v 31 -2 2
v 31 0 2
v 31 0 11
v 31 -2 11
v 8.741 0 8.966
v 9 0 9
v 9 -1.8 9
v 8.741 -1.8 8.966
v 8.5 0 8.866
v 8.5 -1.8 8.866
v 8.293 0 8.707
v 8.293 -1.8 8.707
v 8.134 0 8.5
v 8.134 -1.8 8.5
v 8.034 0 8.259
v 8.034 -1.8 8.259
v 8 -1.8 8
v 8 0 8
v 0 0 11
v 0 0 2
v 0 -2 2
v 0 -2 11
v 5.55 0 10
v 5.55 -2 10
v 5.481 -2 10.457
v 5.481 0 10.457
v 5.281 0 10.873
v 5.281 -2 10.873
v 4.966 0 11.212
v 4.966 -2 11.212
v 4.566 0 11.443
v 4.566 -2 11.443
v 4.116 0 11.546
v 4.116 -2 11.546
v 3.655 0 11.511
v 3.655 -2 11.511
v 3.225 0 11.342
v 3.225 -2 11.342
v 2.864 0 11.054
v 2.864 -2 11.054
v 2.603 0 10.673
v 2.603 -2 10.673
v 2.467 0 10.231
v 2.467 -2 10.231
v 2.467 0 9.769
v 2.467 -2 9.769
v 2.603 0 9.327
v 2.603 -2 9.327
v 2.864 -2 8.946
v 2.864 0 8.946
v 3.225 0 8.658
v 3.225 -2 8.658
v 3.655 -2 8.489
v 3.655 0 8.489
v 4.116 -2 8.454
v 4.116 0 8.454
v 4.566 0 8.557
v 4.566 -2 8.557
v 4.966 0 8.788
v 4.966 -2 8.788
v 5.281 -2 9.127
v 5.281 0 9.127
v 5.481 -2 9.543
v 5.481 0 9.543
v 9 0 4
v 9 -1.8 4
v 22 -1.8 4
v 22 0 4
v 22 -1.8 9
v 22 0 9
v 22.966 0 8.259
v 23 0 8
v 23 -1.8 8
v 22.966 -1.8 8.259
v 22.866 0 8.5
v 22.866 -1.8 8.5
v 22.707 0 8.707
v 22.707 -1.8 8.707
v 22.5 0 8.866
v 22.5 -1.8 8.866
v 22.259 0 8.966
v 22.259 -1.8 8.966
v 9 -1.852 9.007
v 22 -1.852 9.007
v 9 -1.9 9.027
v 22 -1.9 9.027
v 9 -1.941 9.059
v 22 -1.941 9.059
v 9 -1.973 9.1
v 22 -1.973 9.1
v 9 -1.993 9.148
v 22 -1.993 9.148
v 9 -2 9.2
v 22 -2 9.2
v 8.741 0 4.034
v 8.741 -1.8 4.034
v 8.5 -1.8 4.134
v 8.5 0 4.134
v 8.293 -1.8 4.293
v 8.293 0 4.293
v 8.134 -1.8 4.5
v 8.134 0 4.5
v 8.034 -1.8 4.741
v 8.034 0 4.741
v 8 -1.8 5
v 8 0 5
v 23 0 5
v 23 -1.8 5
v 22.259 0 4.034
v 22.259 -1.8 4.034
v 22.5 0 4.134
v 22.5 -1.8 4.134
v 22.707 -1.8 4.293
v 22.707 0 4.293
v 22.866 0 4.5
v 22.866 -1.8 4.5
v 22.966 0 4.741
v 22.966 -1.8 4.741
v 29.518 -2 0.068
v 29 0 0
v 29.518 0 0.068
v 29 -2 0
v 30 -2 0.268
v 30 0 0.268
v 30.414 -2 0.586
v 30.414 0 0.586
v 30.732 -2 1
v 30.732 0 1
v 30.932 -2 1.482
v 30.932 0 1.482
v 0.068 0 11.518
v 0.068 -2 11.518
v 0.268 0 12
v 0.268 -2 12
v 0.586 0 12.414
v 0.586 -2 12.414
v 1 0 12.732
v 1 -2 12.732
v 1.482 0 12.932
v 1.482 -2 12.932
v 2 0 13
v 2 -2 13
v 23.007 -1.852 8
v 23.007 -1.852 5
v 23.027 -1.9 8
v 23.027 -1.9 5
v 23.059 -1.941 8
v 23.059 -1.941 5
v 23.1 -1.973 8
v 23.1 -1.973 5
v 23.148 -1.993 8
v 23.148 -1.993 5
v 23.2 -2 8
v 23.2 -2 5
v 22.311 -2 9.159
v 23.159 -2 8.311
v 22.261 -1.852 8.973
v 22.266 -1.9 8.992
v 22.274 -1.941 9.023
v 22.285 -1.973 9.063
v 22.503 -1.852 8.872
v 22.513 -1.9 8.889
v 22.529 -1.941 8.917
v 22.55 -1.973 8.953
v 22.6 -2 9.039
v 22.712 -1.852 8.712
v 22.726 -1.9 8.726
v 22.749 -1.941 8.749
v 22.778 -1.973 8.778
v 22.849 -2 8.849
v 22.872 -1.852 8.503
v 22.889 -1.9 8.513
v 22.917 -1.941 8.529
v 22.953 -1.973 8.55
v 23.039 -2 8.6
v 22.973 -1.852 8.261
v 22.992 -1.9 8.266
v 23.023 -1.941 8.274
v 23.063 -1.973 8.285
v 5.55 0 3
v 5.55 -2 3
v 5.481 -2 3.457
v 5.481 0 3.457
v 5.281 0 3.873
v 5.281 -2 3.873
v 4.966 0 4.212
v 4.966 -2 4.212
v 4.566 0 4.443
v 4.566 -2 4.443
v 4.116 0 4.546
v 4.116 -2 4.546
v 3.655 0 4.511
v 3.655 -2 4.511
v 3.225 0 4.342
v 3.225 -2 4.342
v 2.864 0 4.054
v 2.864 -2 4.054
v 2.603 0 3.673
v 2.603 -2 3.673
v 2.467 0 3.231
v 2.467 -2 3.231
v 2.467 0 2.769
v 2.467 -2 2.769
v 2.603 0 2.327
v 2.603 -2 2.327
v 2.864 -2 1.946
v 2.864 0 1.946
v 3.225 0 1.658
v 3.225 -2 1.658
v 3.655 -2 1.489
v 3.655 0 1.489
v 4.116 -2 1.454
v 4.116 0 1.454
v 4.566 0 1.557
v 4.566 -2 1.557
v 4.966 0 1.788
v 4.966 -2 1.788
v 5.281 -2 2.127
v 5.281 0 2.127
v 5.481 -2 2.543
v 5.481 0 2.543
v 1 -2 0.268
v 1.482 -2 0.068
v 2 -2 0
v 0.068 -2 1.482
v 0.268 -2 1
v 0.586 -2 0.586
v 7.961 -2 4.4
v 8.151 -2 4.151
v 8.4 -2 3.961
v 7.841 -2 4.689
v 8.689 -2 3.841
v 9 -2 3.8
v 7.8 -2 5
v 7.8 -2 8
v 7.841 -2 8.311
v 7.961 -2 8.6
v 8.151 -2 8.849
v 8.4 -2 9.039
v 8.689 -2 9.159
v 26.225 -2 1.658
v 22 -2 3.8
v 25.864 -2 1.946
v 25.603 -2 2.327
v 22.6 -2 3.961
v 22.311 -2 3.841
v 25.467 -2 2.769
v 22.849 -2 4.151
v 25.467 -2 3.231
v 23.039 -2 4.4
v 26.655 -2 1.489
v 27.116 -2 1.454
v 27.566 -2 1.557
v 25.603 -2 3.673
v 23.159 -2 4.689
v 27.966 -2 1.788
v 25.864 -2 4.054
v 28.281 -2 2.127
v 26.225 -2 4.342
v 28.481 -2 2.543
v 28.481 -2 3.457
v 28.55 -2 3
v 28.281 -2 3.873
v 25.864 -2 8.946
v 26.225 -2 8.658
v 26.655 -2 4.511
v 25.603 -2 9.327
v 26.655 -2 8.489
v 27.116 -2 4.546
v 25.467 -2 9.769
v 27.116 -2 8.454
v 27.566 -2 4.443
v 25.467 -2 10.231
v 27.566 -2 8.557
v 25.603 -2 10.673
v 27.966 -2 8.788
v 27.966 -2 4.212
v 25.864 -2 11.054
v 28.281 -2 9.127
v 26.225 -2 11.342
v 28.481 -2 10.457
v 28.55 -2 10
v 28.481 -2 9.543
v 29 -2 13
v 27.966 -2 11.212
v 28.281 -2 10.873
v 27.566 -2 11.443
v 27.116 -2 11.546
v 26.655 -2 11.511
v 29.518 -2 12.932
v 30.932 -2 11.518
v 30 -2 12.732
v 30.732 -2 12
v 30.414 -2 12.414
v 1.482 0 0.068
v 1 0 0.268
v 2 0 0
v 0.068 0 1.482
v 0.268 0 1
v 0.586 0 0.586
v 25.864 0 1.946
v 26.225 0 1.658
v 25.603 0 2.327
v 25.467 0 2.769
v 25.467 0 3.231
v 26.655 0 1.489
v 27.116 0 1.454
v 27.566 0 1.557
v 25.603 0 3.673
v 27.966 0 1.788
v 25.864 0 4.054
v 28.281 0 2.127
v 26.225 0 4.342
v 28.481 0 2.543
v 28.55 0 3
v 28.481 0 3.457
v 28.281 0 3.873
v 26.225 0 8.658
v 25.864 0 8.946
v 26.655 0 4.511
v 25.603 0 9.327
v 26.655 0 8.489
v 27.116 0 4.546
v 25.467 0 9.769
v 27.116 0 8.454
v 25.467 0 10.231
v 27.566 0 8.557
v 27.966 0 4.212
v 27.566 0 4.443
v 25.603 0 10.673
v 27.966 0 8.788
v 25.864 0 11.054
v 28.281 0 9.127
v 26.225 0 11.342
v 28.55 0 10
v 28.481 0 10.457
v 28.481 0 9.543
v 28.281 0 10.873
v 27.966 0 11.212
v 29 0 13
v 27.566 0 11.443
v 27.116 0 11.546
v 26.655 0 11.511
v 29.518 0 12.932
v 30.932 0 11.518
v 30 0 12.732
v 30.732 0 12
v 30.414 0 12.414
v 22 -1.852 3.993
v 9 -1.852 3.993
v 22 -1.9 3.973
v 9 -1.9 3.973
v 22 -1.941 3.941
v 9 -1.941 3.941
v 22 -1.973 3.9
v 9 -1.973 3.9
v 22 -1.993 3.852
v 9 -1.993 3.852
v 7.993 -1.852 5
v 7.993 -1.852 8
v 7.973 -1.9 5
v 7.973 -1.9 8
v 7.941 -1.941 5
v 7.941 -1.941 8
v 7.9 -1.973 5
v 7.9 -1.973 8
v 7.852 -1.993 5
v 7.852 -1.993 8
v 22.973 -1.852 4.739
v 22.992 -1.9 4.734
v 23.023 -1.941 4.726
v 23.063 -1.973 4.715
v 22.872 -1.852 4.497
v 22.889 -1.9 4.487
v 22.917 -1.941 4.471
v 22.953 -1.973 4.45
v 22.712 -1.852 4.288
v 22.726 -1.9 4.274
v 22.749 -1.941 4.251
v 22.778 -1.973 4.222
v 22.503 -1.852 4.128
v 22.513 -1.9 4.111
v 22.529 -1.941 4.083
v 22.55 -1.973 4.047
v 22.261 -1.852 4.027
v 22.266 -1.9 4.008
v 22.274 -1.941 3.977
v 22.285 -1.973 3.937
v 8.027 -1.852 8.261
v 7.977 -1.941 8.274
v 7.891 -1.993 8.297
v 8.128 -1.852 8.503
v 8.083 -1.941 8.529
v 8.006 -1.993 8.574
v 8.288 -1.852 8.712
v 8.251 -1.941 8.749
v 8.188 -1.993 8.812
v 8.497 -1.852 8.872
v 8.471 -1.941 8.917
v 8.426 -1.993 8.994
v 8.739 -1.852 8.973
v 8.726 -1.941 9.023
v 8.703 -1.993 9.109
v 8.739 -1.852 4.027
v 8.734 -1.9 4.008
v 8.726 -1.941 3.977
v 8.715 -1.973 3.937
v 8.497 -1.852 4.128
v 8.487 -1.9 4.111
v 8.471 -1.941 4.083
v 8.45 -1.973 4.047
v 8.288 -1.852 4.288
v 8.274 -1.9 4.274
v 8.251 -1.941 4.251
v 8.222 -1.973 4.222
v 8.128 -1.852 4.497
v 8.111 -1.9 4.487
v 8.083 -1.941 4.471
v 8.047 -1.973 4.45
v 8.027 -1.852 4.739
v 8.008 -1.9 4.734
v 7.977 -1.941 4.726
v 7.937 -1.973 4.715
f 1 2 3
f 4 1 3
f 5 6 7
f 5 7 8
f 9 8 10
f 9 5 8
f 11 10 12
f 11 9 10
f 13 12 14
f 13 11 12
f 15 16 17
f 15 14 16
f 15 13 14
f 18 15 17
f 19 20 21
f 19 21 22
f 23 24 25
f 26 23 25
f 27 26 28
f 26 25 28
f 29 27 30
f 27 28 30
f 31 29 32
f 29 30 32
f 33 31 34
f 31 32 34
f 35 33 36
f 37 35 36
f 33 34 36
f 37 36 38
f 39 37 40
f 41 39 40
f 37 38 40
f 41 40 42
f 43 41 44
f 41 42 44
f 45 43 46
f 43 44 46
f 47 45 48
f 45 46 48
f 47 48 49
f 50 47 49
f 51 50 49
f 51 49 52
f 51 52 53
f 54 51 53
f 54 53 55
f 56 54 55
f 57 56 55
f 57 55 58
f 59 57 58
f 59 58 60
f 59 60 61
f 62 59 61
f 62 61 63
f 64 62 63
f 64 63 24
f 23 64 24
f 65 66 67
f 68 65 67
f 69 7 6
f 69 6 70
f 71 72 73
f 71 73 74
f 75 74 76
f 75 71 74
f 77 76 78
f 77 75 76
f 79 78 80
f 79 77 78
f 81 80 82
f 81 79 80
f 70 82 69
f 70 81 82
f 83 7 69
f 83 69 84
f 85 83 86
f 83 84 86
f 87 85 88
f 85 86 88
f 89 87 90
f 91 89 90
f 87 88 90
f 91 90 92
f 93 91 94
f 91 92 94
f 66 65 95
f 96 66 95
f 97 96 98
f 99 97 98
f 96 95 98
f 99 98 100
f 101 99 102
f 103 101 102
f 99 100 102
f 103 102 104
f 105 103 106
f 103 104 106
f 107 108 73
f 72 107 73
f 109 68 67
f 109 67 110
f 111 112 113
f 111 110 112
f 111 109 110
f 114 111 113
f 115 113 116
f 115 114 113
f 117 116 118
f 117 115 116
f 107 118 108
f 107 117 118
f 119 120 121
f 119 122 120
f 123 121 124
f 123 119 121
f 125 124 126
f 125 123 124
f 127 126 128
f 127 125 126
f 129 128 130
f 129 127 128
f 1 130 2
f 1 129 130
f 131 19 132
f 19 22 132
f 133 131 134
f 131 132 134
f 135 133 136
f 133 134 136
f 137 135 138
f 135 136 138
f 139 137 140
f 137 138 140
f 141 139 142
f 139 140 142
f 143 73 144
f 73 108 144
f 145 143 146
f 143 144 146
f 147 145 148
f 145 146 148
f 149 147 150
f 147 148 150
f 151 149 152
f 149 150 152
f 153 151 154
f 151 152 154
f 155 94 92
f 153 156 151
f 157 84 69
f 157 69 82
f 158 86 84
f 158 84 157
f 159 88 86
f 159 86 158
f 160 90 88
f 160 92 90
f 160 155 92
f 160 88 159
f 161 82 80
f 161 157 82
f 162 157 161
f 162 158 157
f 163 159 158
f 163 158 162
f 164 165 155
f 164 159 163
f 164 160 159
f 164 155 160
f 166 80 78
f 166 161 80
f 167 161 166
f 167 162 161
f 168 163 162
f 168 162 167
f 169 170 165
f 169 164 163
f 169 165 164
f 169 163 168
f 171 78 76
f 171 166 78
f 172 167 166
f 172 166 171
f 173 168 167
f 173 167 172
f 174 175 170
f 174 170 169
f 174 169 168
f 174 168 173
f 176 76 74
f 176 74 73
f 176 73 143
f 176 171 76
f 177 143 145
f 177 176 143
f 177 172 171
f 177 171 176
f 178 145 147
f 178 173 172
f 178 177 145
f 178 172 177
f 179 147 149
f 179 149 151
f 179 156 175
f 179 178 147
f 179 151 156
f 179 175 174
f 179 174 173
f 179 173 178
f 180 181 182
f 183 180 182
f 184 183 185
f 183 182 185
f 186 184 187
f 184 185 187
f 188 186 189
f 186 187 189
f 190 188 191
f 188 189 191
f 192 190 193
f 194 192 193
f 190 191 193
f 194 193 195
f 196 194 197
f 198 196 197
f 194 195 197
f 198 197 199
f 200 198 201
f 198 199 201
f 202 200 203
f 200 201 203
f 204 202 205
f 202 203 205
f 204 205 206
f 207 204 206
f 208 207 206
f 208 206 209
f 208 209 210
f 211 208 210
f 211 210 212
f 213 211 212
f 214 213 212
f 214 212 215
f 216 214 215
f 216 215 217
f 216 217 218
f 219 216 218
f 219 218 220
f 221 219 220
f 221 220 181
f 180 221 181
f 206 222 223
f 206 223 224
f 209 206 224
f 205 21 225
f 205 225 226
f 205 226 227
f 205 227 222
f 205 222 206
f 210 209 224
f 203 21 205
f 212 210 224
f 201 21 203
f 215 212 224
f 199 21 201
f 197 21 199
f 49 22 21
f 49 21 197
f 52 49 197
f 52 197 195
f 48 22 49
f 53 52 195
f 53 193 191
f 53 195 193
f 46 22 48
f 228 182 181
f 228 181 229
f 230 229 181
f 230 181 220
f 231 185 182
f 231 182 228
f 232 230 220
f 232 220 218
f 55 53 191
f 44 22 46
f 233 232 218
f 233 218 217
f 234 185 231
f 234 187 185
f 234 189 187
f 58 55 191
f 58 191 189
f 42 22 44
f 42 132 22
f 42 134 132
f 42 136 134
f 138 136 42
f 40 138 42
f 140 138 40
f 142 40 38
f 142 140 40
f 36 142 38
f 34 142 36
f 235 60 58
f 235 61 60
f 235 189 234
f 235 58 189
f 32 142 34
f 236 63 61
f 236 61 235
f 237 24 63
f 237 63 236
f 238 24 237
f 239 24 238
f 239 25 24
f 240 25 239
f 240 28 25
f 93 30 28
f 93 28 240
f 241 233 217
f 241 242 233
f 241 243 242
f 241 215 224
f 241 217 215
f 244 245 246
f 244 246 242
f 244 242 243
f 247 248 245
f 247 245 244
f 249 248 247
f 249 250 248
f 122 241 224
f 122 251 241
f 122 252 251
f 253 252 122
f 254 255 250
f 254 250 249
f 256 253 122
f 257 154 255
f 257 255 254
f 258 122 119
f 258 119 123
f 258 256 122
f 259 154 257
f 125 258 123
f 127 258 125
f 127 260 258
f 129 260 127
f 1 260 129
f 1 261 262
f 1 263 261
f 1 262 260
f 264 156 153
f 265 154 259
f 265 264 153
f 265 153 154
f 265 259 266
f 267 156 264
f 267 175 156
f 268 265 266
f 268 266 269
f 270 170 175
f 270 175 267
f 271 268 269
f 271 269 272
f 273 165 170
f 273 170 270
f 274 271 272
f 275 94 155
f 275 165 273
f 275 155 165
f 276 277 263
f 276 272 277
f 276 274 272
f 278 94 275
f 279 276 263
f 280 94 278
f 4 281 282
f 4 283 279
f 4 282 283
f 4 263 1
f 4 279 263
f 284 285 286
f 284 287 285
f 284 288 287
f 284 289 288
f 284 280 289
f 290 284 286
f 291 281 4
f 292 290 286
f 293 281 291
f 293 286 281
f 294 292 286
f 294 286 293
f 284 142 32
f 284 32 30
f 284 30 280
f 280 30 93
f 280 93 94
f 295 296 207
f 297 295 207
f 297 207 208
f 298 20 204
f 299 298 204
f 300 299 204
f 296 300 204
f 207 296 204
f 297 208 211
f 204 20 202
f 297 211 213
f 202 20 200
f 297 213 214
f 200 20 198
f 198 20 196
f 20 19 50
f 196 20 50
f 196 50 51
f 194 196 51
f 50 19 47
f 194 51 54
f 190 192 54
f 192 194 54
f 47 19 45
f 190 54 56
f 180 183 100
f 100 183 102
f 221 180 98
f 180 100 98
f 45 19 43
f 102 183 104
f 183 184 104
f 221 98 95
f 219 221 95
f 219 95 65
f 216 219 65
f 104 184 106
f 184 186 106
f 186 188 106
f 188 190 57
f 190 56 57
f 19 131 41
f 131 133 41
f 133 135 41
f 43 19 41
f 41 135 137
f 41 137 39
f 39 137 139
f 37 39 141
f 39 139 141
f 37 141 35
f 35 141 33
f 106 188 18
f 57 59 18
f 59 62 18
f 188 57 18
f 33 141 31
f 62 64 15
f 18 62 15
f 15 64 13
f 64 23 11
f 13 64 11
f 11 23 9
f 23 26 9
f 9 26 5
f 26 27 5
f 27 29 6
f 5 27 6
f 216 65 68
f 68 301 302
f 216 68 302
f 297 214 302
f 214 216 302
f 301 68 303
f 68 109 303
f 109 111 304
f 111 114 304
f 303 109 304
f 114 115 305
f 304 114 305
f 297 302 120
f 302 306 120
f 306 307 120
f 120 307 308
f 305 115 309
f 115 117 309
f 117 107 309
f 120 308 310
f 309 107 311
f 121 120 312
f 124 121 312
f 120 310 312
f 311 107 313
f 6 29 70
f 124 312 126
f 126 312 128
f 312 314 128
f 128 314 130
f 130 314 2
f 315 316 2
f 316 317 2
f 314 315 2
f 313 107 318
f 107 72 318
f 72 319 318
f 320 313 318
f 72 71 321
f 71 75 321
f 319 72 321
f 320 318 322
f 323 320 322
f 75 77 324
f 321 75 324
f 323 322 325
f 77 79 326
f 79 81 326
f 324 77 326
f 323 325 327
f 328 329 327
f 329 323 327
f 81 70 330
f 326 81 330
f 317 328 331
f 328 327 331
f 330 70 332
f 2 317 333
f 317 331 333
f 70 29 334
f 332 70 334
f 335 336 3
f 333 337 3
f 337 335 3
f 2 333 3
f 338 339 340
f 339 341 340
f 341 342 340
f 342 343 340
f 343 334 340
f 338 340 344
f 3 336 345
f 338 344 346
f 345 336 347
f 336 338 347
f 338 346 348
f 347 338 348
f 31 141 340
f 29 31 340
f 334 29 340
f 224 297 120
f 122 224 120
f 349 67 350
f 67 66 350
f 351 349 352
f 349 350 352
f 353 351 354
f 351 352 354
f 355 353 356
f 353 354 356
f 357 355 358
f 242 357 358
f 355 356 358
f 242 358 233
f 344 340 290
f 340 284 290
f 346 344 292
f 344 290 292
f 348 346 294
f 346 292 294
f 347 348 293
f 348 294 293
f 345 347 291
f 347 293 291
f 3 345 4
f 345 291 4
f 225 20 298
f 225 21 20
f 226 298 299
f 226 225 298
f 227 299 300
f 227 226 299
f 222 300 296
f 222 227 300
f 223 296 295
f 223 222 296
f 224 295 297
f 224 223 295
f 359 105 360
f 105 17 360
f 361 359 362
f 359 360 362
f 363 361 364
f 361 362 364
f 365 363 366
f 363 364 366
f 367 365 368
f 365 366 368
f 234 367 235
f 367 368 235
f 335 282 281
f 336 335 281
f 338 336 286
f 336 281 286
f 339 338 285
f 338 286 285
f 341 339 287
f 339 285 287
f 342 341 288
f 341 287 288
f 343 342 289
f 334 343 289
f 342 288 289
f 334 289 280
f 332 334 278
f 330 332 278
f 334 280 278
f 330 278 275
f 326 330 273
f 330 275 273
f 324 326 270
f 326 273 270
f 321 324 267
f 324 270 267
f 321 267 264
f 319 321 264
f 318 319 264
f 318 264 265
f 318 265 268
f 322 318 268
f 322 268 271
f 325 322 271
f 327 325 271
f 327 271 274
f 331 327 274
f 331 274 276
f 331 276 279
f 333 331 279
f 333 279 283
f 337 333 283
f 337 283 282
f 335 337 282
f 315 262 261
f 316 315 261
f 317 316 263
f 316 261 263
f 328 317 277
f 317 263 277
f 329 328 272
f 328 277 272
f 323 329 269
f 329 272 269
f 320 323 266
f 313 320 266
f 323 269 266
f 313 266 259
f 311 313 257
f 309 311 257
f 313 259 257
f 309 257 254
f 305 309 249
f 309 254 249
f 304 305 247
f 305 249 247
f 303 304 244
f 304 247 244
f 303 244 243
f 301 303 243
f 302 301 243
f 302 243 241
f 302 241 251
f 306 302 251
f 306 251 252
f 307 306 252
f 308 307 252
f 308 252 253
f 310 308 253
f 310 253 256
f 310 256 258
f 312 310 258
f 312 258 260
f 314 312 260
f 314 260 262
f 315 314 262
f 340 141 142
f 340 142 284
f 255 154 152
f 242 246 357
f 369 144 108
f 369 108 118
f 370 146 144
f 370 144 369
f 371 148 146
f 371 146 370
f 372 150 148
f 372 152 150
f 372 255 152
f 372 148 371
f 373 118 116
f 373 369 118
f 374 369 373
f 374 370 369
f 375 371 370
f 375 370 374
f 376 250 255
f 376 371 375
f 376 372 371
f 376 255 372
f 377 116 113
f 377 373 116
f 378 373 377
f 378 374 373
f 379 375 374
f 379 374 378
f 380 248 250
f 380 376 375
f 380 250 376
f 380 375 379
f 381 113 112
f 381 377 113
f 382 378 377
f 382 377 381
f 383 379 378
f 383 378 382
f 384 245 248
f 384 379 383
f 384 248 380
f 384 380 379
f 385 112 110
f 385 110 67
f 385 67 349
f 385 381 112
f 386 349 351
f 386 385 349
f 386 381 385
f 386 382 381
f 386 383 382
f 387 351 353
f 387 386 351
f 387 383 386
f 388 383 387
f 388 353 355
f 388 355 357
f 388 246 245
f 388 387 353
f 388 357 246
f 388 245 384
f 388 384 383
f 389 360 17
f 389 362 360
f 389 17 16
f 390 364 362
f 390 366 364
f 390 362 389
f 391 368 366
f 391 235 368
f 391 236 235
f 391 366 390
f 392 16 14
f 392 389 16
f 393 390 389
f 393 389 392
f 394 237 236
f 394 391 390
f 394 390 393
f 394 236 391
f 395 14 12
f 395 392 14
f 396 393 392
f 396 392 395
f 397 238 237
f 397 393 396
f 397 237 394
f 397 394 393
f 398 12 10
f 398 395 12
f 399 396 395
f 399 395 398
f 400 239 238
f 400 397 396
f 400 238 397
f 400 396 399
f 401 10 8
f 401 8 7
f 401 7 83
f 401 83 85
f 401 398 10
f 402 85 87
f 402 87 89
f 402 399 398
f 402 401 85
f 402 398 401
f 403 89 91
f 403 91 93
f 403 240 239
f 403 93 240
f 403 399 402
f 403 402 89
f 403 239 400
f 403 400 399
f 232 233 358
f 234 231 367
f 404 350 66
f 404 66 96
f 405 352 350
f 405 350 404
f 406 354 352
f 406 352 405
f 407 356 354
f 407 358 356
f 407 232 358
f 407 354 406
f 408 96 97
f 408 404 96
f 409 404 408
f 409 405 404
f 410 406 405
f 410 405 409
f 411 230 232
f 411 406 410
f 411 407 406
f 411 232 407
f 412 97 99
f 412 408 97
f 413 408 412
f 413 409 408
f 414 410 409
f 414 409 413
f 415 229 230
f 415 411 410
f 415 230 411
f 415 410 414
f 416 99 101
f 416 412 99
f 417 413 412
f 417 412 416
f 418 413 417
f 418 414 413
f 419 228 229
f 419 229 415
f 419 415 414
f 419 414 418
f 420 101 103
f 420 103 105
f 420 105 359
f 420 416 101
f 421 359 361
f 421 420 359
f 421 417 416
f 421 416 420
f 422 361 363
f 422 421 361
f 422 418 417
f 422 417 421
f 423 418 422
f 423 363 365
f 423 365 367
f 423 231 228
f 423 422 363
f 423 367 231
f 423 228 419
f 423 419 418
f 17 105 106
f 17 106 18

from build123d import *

# Parameters (mm, degrees)
F0_W     = 31
F0_H     = 13
F1_DEPTH = 2
F2_R     = 1.55
F3_DEPTH = 25
F4_R     = 2
F5_W     = 15
F5_H     = 5
F6_DEPTH = 25
F7_R     = 1
F8_R     = 0.2


with BuildPart() as f1:
    # F0 (on Front) → F1 (new body)
    with BuildSketch(Plane.XZ):
        with Locations((15.5, 6.5)):
            Rectangle(F0_W, F0_H)
    extrude(amount=F1_DEPTH)

    # F2 (on face) → F3 (cut)
    with BuildSketch(Plane.XZ.offset(2)):
        with Locations((4, 10)):
            Circle(F2_R)
        with Locations((4, 3)):
            Circle(F2_R)
        with Locations((27, 10)):
            Circle(F2_R)
        with Locations((27, 3)):
            Circle(F2_R)
    extrude(amount=-F3_DEPTH, mode=Mode.SUBTRACT)

    # F4
    f4_edges = [f1.edges().sort_by_distance(p)[0] for p in [
        (31, -1, 13),
        (31, -1, 0),
        (0, -1, 0),
        (0, -1, 13),
    ]]
    fillet(f4_edges, radius=F4_R)

    # F5 (on face) → F6 (cut)
    with BuildSketch(Plane.XZ.offset(2)):
        with Locations((15.5, 6.5)):
            Rectangle(F5_W, F5_H)
    extrude(amount=-F6_DEPTH, mode=Mode.SUBTRACT)

    # F7
    f7_edges = [f1.edges().sort_by_distance(p)[0] for p in [
        (8, -1, 9),
        (8, -1, 4),
        (23, -1, 9),
        (23, -1, 4),
    ]]
    fillet(f7_edges, radius=F7_R)

    # F8
    f8_edges = [f1.edges().sort_by_distance(p)[0] for p in [
        (15.5, -2, 9),
        (22.707107, -2, 8.707107),
        (23, -2, 6.5),
        (22.707107, -2, 4.292893),
        (15.5, -2, 4),
        (8.292893, -2, 4.292893),
        (8, -2, 6.5),
        (8.292893, -2, 8.707107),
    ]]
    fillet(f8_edges, radius=F8_R)


solid = f1.part
